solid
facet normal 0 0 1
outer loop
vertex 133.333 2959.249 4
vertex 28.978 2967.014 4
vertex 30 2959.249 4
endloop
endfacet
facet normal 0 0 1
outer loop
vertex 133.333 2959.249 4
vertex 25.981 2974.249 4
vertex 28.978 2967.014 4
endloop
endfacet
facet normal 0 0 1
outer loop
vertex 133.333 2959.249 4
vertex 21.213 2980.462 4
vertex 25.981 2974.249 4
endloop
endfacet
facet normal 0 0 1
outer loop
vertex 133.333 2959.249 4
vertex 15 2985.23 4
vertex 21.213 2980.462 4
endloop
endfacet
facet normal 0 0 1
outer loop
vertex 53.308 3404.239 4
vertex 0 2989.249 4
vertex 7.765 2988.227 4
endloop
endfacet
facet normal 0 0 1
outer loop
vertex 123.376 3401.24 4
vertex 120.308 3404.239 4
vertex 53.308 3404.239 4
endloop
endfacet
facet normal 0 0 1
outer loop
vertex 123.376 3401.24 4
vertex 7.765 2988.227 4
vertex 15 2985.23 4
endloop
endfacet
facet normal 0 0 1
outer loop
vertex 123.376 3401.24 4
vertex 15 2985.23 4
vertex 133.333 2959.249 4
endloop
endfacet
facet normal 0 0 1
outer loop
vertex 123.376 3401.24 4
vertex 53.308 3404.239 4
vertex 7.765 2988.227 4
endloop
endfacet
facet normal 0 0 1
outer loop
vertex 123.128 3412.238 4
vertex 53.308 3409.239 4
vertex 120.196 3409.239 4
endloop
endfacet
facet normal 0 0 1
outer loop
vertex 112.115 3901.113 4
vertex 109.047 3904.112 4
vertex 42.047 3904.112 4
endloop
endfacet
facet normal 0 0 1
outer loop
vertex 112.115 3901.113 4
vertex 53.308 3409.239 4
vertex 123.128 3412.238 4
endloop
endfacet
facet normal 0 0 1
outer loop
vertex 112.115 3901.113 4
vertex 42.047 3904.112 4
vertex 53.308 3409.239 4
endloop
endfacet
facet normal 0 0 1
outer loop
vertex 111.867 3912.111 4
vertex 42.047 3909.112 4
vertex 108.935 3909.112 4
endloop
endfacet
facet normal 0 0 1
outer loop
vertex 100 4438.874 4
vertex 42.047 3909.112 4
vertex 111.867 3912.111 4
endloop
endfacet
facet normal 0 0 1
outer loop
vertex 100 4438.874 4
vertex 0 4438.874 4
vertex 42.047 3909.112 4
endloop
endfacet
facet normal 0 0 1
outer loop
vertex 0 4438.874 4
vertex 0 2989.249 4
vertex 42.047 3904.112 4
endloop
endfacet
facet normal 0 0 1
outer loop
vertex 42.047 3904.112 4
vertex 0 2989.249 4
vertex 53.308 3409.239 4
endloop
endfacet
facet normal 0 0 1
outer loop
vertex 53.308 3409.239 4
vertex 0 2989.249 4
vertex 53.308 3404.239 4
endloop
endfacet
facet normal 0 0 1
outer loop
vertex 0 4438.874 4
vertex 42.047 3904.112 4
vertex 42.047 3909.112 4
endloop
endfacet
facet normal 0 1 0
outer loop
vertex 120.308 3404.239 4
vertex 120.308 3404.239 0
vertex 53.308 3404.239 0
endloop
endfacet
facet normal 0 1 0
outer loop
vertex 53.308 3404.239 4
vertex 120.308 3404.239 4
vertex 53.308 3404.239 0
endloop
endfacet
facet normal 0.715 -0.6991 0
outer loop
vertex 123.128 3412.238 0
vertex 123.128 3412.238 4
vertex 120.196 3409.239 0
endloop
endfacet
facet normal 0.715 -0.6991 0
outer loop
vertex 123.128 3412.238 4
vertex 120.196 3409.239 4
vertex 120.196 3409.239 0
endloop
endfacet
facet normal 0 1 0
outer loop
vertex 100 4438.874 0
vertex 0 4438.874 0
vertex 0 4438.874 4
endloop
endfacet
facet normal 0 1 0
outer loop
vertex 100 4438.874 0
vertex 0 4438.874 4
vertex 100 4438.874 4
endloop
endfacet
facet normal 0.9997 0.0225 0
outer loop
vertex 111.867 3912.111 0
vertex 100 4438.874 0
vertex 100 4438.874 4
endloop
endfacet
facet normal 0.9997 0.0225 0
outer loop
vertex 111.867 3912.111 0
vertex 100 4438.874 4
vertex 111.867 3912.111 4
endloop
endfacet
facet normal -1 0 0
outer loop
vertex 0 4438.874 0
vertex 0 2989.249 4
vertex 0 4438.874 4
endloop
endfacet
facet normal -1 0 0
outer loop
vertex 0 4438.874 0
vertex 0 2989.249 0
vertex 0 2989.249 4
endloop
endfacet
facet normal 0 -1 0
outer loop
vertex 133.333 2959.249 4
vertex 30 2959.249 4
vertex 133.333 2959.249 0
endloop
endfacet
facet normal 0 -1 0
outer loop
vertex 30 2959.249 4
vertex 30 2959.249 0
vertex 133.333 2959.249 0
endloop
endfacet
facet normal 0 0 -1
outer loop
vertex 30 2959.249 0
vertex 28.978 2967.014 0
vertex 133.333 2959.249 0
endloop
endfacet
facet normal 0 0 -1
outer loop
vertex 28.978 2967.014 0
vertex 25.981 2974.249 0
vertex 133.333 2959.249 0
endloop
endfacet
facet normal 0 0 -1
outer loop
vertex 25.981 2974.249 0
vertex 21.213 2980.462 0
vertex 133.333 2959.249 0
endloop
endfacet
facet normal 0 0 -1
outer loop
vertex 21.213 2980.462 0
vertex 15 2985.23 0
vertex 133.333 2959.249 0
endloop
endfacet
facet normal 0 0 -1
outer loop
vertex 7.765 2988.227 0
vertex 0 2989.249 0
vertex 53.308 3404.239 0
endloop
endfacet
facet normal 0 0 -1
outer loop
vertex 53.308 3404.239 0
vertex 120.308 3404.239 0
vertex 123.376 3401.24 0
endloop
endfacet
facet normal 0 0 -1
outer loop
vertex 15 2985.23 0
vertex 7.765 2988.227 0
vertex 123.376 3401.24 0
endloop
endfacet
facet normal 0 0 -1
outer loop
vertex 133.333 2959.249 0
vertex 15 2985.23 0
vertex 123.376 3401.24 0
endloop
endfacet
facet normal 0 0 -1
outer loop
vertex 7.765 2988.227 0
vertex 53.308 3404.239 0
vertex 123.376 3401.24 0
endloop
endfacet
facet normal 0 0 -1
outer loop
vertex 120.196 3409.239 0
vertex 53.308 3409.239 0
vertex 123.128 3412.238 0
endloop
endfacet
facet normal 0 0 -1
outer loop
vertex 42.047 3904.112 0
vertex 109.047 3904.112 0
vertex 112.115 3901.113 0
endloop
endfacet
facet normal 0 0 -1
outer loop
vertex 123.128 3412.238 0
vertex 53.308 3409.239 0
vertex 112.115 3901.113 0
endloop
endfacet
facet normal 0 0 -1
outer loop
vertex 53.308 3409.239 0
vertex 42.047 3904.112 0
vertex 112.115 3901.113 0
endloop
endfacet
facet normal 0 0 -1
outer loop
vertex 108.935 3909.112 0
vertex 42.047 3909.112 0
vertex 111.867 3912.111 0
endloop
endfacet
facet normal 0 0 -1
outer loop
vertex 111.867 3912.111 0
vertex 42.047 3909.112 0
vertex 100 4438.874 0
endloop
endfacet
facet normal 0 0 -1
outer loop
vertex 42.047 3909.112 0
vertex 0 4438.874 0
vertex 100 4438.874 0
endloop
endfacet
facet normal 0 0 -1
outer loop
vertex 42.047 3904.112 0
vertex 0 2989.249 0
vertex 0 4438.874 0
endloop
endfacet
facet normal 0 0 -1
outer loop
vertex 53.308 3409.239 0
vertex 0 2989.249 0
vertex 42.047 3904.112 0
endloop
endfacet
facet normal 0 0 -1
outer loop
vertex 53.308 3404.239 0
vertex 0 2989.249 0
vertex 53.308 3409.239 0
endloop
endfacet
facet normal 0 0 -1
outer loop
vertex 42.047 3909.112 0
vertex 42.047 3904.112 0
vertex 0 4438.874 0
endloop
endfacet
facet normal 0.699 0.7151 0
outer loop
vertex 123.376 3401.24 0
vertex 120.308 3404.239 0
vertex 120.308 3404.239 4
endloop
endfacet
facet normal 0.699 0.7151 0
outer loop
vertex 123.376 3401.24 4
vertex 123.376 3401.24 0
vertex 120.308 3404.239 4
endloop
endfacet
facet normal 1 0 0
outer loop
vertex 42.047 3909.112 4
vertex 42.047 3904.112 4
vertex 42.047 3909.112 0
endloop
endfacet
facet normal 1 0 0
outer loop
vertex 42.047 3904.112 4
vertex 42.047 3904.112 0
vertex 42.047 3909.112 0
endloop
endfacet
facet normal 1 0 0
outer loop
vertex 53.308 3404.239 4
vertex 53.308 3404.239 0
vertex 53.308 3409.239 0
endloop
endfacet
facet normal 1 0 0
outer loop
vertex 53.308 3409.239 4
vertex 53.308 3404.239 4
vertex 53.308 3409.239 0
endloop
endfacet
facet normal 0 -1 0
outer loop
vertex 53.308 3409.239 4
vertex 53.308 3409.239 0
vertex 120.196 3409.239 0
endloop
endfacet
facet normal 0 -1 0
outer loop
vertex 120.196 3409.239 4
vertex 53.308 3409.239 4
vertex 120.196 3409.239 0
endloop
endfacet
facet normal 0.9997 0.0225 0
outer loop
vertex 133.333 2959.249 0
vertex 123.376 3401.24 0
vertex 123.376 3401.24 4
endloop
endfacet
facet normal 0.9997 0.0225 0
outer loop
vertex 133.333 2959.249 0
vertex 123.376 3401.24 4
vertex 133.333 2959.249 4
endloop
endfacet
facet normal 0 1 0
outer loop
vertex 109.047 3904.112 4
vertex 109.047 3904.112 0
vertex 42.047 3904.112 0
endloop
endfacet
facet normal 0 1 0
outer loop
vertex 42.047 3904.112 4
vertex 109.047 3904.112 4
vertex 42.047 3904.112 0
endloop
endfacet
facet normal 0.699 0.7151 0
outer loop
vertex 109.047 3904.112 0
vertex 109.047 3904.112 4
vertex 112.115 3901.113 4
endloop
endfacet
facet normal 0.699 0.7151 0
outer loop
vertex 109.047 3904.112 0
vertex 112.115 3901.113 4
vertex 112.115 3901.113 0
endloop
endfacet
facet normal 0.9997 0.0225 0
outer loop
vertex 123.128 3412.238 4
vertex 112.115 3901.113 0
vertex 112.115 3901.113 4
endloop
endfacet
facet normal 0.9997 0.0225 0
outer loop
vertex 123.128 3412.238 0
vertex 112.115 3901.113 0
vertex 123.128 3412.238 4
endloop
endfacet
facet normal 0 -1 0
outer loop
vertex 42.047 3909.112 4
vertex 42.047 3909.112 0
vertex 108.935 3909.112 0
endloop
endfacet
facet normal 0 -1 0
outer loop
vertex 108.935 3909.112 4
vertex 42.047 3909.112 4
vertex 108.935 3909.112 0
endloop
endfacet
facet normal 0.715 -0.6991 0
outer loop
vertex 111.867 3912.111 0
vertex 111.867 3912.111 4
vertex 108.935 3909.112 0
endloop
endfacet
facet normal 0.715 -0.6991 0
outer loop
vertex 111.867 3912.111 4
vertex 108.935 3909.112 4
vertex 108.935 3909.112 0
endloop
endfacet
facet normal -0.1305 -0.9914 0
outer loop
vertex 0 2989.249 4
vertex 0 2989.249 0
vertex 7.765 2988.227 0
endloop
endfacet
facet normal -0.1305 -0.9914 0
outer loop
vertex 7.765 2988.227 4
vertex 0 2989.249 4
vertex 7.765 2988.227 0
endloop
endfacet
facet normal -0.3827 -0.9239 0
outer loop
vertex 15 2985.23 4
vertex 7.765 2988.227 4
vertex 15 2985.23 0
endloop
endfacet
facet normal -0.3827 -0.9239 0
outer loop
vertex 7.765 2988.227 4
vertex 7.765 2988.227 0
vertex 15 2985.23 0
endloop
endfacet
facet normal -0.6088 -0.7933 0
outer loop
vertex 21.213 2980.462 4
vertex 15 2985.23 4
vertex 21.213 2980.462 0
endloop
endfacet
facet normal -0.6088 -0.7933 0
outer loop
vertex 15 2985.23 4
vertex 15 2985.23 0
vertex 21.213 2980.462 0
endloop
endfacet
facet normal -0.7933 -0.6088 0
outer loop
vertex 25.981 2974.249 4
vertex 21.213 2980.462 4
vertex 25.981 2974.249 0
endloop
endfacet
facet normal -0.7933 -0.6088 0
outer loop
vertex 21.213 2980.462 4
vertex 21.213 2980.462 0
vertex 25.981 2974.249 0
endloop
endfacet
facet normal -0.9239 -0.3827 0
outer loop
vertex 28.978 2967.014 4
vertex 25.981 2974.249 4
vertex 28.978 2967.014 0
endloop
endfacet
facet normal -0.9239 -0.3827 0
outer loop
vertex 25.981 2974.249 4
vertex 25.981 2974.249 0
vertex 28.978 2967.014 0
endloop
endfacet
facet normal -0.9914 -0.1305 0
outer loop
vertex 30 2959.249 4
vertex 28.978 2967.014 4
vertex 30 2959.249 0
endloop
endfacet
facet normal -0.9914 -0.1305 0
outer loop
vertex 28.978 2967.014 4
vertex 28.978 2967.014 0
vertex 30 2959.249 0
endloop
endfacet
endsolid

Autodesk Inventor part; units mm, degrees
ref_plane "YZ Plane" through (0, 0, 0) normal (1, 0, 0) x (0, 1, 0)
ref_plane "XZ Plane" through (0, 0, 0) normal (0, 1, 0) x (-1, 0, 0)
ref_plane "XY Plane" through (0, 0, 0) normal (0, 0, 1) x (1, 0, 0)
sketch "Sketch1" plane through (0, 0, 0) normal (0, 0, 1) x (1, 0, 0)
  line L0 (0, 0) -> (0, 4438.8737)
  line L1 (0, 4438.8737) -> (100, 4438.8737)
  line L2 (100, 4438.8737) -> (200, 0)
  line L3 (200, 0) -> (0, 0)
  circle A0 centre (0, 0) radius 30
  line L4 (0, 1479.6246) -> (166.6667, 1479.6246)
  line L5 (0, 2959.2492) -> (133.3333, 2959.2492)
  circle A1 centre (0, 1479.6246) radius 30
  circle A2 centre (0, 2959.2492) radius 30
  line L6 (190.8761, 405) -> (120.8761, 405)
  line L7 (120.8761, 405) -> (120.8761, 410)
  line L8 (120.8761, 410) -> (190.8761, 410)
  line L9 (190.8761, 410) -> (190.8761, 405)
  line L10 (109.6148, 909.8732) -> (179.6148, 909.8732)
  line L11 (179.6148, 904.8732) -> (109.6148, 904.8732)
  line L12 (109.6148, 904.8732) -> (109.6148, 909.8732)
  line L13 (179.6148, 909.8732) -> (179.6148, 904.8732)
  line L14 (98.3535, 1409.7463) -> (168.3535, 1409.7463)
  line L15 (168.3535, 1404.7463) -> (98.3535, 1404.7463)
  line L16 (98.3535, 1404.7463) -> (98.3535, 1409.7463)
  line L17 (168.3535, 1409.7463) -> (168.3535, 1404.7463)
  line L18 (87.0923, 1909.6195) -> (157.0923, 1909.6195)
  line L19 (157.0923, 1904.6195) -> (87.0923, 1904.6195)
  line L20 (87.0923, 1904.6195) -> (87.0923, 1909.6195)
  line L21 (157.0923, 1909.6195) -> (157.0923, 1904.6195)
  line L22 (75.831, 2409.4927) -> (145.831, 2409.4927)
  line L23 (145.831, 2404.4927) -> (75.831, 2404.4927)
  line L24 (75.831, 2404.4927) -> (75.831, 2409.4927)
  line L25 (145.831, 2409.4927) -> (145.831, 2404.4927)
  line L26 (64.5698, 2909.3658) -> (134.5698, 2909.3658)
  line L27 (134.5698, 2904.3658) -> (64.5698, 2904.3658)
  line L28 (64.5698, 2904.3658) -> (64.5698, 2909.3658)
  line L29 (134.5698, 2909.3658) -> (134.5698, 2904.3658)
  line L30 (53.3085, 3409.239) -> (123.3085, 3409.239)
  line L31 (123.3085, 3404.239) -> (53.3085, 3404.239)
  line L32 (53.3085, 3404.239) -> (53.3085, 3409.239)
  line L33 (123.3085, 3409.239) -> (123.3085, 3404.239)
  line L34 (42.0472, 3909.1122) -> (112.0472, 3909.1122)
  line L35 (112.0472, 3904.1122) -> (42.0472, 3904.1122)
  line L36 (42.0472, 3904.1122) -> (42.0472, 3909.1122)
  line L37 (112.0472, 3909.1122) -> (112.0472, 3904.1122)
  line L38 (0, 1629.6246) -> (163.2874, 1629.6246)
  line L39 (0, 3079.2492) -> (130.6299, 3079.2492)
  point P0 (30, 2959.2492)
  point P1 (0, 2929.2492)
  point P2 (0, 1509.6246)
  point P3 (0, 1449.6246)
  point P4 (0, 30)
  point P5 (30, 0)
  point P6 (190.7634, 410)
  point P7 (179.5022, 909.8732)
  point P8 (168.3535, 1404.7463)
  point P9 (168.2409, 1409.7463)
  point P10 (30, 1479.6246)
  point P11 (157.0923, 1904.6195)
  point P12 (156.9796, 1909.6195)
  point P13 (145.831, 2404.4927)
  point P14 (145.7184, 2409.4927)
  point P15 (134.5698, 2904.3658)
  point P16 (134.4571, 2909.3658)
  point P17 (0, 2989.2492)
  point P18 (123.3085, 3404.239)
  point P19 (123.1959, 3409.239)
  point P20 (112.0472, 3904.1122)
  point P21 (111.9346, 3909.1122)
  dimension "d65" = 100
  dimension "d67" = 200
  dimension "d68" = 60
  dimension "d69" = 1480
  dimension "d70" = 1480
  dimension "d71" = 1480
  dimension "d72" = 5
  dimension "d73" = 70
  dimension "d74" = 410
  dimension "d77" = 500
  dimension "d82" = 120
  dimension "d83" = 150
extrude "Plate3" add sketch "Sketch1" along normal blind 4 contours L39 L2 L5 A2 L0 | L0 L1 L2 L34 L36 L35 L30 L32 L31 L39
chamfer "Corner Chamfer2" distance 3 angle 45 4 edges at (123.3085, 3404.239, 2) (123.1959, 3409.239, 2) (112.0472, 3904.1122, 2) (111.9346, 3909.1122, 2)
equation "\"BendRadius\" = Thickness"
equation "\"BendReliefWidth\" = Thickness"
equation "\"BendReliefDepth\" = 0.5 * Thickness"
equation "\"CornerReliefSize\" = 4 * Thickness"
equation "\"MinimumRemnant\" = 2 * Thickness"
equation "\"TransitionRadius\" = BendRadius"
equation "\"JacobiRadiusSize\" = BendRadius"
equation "\"GapSize\" = Thickness"
equation "\"Thickness\" = 4"
properties part number "GBK 3311 central third rib_CPY" material "Steel"
